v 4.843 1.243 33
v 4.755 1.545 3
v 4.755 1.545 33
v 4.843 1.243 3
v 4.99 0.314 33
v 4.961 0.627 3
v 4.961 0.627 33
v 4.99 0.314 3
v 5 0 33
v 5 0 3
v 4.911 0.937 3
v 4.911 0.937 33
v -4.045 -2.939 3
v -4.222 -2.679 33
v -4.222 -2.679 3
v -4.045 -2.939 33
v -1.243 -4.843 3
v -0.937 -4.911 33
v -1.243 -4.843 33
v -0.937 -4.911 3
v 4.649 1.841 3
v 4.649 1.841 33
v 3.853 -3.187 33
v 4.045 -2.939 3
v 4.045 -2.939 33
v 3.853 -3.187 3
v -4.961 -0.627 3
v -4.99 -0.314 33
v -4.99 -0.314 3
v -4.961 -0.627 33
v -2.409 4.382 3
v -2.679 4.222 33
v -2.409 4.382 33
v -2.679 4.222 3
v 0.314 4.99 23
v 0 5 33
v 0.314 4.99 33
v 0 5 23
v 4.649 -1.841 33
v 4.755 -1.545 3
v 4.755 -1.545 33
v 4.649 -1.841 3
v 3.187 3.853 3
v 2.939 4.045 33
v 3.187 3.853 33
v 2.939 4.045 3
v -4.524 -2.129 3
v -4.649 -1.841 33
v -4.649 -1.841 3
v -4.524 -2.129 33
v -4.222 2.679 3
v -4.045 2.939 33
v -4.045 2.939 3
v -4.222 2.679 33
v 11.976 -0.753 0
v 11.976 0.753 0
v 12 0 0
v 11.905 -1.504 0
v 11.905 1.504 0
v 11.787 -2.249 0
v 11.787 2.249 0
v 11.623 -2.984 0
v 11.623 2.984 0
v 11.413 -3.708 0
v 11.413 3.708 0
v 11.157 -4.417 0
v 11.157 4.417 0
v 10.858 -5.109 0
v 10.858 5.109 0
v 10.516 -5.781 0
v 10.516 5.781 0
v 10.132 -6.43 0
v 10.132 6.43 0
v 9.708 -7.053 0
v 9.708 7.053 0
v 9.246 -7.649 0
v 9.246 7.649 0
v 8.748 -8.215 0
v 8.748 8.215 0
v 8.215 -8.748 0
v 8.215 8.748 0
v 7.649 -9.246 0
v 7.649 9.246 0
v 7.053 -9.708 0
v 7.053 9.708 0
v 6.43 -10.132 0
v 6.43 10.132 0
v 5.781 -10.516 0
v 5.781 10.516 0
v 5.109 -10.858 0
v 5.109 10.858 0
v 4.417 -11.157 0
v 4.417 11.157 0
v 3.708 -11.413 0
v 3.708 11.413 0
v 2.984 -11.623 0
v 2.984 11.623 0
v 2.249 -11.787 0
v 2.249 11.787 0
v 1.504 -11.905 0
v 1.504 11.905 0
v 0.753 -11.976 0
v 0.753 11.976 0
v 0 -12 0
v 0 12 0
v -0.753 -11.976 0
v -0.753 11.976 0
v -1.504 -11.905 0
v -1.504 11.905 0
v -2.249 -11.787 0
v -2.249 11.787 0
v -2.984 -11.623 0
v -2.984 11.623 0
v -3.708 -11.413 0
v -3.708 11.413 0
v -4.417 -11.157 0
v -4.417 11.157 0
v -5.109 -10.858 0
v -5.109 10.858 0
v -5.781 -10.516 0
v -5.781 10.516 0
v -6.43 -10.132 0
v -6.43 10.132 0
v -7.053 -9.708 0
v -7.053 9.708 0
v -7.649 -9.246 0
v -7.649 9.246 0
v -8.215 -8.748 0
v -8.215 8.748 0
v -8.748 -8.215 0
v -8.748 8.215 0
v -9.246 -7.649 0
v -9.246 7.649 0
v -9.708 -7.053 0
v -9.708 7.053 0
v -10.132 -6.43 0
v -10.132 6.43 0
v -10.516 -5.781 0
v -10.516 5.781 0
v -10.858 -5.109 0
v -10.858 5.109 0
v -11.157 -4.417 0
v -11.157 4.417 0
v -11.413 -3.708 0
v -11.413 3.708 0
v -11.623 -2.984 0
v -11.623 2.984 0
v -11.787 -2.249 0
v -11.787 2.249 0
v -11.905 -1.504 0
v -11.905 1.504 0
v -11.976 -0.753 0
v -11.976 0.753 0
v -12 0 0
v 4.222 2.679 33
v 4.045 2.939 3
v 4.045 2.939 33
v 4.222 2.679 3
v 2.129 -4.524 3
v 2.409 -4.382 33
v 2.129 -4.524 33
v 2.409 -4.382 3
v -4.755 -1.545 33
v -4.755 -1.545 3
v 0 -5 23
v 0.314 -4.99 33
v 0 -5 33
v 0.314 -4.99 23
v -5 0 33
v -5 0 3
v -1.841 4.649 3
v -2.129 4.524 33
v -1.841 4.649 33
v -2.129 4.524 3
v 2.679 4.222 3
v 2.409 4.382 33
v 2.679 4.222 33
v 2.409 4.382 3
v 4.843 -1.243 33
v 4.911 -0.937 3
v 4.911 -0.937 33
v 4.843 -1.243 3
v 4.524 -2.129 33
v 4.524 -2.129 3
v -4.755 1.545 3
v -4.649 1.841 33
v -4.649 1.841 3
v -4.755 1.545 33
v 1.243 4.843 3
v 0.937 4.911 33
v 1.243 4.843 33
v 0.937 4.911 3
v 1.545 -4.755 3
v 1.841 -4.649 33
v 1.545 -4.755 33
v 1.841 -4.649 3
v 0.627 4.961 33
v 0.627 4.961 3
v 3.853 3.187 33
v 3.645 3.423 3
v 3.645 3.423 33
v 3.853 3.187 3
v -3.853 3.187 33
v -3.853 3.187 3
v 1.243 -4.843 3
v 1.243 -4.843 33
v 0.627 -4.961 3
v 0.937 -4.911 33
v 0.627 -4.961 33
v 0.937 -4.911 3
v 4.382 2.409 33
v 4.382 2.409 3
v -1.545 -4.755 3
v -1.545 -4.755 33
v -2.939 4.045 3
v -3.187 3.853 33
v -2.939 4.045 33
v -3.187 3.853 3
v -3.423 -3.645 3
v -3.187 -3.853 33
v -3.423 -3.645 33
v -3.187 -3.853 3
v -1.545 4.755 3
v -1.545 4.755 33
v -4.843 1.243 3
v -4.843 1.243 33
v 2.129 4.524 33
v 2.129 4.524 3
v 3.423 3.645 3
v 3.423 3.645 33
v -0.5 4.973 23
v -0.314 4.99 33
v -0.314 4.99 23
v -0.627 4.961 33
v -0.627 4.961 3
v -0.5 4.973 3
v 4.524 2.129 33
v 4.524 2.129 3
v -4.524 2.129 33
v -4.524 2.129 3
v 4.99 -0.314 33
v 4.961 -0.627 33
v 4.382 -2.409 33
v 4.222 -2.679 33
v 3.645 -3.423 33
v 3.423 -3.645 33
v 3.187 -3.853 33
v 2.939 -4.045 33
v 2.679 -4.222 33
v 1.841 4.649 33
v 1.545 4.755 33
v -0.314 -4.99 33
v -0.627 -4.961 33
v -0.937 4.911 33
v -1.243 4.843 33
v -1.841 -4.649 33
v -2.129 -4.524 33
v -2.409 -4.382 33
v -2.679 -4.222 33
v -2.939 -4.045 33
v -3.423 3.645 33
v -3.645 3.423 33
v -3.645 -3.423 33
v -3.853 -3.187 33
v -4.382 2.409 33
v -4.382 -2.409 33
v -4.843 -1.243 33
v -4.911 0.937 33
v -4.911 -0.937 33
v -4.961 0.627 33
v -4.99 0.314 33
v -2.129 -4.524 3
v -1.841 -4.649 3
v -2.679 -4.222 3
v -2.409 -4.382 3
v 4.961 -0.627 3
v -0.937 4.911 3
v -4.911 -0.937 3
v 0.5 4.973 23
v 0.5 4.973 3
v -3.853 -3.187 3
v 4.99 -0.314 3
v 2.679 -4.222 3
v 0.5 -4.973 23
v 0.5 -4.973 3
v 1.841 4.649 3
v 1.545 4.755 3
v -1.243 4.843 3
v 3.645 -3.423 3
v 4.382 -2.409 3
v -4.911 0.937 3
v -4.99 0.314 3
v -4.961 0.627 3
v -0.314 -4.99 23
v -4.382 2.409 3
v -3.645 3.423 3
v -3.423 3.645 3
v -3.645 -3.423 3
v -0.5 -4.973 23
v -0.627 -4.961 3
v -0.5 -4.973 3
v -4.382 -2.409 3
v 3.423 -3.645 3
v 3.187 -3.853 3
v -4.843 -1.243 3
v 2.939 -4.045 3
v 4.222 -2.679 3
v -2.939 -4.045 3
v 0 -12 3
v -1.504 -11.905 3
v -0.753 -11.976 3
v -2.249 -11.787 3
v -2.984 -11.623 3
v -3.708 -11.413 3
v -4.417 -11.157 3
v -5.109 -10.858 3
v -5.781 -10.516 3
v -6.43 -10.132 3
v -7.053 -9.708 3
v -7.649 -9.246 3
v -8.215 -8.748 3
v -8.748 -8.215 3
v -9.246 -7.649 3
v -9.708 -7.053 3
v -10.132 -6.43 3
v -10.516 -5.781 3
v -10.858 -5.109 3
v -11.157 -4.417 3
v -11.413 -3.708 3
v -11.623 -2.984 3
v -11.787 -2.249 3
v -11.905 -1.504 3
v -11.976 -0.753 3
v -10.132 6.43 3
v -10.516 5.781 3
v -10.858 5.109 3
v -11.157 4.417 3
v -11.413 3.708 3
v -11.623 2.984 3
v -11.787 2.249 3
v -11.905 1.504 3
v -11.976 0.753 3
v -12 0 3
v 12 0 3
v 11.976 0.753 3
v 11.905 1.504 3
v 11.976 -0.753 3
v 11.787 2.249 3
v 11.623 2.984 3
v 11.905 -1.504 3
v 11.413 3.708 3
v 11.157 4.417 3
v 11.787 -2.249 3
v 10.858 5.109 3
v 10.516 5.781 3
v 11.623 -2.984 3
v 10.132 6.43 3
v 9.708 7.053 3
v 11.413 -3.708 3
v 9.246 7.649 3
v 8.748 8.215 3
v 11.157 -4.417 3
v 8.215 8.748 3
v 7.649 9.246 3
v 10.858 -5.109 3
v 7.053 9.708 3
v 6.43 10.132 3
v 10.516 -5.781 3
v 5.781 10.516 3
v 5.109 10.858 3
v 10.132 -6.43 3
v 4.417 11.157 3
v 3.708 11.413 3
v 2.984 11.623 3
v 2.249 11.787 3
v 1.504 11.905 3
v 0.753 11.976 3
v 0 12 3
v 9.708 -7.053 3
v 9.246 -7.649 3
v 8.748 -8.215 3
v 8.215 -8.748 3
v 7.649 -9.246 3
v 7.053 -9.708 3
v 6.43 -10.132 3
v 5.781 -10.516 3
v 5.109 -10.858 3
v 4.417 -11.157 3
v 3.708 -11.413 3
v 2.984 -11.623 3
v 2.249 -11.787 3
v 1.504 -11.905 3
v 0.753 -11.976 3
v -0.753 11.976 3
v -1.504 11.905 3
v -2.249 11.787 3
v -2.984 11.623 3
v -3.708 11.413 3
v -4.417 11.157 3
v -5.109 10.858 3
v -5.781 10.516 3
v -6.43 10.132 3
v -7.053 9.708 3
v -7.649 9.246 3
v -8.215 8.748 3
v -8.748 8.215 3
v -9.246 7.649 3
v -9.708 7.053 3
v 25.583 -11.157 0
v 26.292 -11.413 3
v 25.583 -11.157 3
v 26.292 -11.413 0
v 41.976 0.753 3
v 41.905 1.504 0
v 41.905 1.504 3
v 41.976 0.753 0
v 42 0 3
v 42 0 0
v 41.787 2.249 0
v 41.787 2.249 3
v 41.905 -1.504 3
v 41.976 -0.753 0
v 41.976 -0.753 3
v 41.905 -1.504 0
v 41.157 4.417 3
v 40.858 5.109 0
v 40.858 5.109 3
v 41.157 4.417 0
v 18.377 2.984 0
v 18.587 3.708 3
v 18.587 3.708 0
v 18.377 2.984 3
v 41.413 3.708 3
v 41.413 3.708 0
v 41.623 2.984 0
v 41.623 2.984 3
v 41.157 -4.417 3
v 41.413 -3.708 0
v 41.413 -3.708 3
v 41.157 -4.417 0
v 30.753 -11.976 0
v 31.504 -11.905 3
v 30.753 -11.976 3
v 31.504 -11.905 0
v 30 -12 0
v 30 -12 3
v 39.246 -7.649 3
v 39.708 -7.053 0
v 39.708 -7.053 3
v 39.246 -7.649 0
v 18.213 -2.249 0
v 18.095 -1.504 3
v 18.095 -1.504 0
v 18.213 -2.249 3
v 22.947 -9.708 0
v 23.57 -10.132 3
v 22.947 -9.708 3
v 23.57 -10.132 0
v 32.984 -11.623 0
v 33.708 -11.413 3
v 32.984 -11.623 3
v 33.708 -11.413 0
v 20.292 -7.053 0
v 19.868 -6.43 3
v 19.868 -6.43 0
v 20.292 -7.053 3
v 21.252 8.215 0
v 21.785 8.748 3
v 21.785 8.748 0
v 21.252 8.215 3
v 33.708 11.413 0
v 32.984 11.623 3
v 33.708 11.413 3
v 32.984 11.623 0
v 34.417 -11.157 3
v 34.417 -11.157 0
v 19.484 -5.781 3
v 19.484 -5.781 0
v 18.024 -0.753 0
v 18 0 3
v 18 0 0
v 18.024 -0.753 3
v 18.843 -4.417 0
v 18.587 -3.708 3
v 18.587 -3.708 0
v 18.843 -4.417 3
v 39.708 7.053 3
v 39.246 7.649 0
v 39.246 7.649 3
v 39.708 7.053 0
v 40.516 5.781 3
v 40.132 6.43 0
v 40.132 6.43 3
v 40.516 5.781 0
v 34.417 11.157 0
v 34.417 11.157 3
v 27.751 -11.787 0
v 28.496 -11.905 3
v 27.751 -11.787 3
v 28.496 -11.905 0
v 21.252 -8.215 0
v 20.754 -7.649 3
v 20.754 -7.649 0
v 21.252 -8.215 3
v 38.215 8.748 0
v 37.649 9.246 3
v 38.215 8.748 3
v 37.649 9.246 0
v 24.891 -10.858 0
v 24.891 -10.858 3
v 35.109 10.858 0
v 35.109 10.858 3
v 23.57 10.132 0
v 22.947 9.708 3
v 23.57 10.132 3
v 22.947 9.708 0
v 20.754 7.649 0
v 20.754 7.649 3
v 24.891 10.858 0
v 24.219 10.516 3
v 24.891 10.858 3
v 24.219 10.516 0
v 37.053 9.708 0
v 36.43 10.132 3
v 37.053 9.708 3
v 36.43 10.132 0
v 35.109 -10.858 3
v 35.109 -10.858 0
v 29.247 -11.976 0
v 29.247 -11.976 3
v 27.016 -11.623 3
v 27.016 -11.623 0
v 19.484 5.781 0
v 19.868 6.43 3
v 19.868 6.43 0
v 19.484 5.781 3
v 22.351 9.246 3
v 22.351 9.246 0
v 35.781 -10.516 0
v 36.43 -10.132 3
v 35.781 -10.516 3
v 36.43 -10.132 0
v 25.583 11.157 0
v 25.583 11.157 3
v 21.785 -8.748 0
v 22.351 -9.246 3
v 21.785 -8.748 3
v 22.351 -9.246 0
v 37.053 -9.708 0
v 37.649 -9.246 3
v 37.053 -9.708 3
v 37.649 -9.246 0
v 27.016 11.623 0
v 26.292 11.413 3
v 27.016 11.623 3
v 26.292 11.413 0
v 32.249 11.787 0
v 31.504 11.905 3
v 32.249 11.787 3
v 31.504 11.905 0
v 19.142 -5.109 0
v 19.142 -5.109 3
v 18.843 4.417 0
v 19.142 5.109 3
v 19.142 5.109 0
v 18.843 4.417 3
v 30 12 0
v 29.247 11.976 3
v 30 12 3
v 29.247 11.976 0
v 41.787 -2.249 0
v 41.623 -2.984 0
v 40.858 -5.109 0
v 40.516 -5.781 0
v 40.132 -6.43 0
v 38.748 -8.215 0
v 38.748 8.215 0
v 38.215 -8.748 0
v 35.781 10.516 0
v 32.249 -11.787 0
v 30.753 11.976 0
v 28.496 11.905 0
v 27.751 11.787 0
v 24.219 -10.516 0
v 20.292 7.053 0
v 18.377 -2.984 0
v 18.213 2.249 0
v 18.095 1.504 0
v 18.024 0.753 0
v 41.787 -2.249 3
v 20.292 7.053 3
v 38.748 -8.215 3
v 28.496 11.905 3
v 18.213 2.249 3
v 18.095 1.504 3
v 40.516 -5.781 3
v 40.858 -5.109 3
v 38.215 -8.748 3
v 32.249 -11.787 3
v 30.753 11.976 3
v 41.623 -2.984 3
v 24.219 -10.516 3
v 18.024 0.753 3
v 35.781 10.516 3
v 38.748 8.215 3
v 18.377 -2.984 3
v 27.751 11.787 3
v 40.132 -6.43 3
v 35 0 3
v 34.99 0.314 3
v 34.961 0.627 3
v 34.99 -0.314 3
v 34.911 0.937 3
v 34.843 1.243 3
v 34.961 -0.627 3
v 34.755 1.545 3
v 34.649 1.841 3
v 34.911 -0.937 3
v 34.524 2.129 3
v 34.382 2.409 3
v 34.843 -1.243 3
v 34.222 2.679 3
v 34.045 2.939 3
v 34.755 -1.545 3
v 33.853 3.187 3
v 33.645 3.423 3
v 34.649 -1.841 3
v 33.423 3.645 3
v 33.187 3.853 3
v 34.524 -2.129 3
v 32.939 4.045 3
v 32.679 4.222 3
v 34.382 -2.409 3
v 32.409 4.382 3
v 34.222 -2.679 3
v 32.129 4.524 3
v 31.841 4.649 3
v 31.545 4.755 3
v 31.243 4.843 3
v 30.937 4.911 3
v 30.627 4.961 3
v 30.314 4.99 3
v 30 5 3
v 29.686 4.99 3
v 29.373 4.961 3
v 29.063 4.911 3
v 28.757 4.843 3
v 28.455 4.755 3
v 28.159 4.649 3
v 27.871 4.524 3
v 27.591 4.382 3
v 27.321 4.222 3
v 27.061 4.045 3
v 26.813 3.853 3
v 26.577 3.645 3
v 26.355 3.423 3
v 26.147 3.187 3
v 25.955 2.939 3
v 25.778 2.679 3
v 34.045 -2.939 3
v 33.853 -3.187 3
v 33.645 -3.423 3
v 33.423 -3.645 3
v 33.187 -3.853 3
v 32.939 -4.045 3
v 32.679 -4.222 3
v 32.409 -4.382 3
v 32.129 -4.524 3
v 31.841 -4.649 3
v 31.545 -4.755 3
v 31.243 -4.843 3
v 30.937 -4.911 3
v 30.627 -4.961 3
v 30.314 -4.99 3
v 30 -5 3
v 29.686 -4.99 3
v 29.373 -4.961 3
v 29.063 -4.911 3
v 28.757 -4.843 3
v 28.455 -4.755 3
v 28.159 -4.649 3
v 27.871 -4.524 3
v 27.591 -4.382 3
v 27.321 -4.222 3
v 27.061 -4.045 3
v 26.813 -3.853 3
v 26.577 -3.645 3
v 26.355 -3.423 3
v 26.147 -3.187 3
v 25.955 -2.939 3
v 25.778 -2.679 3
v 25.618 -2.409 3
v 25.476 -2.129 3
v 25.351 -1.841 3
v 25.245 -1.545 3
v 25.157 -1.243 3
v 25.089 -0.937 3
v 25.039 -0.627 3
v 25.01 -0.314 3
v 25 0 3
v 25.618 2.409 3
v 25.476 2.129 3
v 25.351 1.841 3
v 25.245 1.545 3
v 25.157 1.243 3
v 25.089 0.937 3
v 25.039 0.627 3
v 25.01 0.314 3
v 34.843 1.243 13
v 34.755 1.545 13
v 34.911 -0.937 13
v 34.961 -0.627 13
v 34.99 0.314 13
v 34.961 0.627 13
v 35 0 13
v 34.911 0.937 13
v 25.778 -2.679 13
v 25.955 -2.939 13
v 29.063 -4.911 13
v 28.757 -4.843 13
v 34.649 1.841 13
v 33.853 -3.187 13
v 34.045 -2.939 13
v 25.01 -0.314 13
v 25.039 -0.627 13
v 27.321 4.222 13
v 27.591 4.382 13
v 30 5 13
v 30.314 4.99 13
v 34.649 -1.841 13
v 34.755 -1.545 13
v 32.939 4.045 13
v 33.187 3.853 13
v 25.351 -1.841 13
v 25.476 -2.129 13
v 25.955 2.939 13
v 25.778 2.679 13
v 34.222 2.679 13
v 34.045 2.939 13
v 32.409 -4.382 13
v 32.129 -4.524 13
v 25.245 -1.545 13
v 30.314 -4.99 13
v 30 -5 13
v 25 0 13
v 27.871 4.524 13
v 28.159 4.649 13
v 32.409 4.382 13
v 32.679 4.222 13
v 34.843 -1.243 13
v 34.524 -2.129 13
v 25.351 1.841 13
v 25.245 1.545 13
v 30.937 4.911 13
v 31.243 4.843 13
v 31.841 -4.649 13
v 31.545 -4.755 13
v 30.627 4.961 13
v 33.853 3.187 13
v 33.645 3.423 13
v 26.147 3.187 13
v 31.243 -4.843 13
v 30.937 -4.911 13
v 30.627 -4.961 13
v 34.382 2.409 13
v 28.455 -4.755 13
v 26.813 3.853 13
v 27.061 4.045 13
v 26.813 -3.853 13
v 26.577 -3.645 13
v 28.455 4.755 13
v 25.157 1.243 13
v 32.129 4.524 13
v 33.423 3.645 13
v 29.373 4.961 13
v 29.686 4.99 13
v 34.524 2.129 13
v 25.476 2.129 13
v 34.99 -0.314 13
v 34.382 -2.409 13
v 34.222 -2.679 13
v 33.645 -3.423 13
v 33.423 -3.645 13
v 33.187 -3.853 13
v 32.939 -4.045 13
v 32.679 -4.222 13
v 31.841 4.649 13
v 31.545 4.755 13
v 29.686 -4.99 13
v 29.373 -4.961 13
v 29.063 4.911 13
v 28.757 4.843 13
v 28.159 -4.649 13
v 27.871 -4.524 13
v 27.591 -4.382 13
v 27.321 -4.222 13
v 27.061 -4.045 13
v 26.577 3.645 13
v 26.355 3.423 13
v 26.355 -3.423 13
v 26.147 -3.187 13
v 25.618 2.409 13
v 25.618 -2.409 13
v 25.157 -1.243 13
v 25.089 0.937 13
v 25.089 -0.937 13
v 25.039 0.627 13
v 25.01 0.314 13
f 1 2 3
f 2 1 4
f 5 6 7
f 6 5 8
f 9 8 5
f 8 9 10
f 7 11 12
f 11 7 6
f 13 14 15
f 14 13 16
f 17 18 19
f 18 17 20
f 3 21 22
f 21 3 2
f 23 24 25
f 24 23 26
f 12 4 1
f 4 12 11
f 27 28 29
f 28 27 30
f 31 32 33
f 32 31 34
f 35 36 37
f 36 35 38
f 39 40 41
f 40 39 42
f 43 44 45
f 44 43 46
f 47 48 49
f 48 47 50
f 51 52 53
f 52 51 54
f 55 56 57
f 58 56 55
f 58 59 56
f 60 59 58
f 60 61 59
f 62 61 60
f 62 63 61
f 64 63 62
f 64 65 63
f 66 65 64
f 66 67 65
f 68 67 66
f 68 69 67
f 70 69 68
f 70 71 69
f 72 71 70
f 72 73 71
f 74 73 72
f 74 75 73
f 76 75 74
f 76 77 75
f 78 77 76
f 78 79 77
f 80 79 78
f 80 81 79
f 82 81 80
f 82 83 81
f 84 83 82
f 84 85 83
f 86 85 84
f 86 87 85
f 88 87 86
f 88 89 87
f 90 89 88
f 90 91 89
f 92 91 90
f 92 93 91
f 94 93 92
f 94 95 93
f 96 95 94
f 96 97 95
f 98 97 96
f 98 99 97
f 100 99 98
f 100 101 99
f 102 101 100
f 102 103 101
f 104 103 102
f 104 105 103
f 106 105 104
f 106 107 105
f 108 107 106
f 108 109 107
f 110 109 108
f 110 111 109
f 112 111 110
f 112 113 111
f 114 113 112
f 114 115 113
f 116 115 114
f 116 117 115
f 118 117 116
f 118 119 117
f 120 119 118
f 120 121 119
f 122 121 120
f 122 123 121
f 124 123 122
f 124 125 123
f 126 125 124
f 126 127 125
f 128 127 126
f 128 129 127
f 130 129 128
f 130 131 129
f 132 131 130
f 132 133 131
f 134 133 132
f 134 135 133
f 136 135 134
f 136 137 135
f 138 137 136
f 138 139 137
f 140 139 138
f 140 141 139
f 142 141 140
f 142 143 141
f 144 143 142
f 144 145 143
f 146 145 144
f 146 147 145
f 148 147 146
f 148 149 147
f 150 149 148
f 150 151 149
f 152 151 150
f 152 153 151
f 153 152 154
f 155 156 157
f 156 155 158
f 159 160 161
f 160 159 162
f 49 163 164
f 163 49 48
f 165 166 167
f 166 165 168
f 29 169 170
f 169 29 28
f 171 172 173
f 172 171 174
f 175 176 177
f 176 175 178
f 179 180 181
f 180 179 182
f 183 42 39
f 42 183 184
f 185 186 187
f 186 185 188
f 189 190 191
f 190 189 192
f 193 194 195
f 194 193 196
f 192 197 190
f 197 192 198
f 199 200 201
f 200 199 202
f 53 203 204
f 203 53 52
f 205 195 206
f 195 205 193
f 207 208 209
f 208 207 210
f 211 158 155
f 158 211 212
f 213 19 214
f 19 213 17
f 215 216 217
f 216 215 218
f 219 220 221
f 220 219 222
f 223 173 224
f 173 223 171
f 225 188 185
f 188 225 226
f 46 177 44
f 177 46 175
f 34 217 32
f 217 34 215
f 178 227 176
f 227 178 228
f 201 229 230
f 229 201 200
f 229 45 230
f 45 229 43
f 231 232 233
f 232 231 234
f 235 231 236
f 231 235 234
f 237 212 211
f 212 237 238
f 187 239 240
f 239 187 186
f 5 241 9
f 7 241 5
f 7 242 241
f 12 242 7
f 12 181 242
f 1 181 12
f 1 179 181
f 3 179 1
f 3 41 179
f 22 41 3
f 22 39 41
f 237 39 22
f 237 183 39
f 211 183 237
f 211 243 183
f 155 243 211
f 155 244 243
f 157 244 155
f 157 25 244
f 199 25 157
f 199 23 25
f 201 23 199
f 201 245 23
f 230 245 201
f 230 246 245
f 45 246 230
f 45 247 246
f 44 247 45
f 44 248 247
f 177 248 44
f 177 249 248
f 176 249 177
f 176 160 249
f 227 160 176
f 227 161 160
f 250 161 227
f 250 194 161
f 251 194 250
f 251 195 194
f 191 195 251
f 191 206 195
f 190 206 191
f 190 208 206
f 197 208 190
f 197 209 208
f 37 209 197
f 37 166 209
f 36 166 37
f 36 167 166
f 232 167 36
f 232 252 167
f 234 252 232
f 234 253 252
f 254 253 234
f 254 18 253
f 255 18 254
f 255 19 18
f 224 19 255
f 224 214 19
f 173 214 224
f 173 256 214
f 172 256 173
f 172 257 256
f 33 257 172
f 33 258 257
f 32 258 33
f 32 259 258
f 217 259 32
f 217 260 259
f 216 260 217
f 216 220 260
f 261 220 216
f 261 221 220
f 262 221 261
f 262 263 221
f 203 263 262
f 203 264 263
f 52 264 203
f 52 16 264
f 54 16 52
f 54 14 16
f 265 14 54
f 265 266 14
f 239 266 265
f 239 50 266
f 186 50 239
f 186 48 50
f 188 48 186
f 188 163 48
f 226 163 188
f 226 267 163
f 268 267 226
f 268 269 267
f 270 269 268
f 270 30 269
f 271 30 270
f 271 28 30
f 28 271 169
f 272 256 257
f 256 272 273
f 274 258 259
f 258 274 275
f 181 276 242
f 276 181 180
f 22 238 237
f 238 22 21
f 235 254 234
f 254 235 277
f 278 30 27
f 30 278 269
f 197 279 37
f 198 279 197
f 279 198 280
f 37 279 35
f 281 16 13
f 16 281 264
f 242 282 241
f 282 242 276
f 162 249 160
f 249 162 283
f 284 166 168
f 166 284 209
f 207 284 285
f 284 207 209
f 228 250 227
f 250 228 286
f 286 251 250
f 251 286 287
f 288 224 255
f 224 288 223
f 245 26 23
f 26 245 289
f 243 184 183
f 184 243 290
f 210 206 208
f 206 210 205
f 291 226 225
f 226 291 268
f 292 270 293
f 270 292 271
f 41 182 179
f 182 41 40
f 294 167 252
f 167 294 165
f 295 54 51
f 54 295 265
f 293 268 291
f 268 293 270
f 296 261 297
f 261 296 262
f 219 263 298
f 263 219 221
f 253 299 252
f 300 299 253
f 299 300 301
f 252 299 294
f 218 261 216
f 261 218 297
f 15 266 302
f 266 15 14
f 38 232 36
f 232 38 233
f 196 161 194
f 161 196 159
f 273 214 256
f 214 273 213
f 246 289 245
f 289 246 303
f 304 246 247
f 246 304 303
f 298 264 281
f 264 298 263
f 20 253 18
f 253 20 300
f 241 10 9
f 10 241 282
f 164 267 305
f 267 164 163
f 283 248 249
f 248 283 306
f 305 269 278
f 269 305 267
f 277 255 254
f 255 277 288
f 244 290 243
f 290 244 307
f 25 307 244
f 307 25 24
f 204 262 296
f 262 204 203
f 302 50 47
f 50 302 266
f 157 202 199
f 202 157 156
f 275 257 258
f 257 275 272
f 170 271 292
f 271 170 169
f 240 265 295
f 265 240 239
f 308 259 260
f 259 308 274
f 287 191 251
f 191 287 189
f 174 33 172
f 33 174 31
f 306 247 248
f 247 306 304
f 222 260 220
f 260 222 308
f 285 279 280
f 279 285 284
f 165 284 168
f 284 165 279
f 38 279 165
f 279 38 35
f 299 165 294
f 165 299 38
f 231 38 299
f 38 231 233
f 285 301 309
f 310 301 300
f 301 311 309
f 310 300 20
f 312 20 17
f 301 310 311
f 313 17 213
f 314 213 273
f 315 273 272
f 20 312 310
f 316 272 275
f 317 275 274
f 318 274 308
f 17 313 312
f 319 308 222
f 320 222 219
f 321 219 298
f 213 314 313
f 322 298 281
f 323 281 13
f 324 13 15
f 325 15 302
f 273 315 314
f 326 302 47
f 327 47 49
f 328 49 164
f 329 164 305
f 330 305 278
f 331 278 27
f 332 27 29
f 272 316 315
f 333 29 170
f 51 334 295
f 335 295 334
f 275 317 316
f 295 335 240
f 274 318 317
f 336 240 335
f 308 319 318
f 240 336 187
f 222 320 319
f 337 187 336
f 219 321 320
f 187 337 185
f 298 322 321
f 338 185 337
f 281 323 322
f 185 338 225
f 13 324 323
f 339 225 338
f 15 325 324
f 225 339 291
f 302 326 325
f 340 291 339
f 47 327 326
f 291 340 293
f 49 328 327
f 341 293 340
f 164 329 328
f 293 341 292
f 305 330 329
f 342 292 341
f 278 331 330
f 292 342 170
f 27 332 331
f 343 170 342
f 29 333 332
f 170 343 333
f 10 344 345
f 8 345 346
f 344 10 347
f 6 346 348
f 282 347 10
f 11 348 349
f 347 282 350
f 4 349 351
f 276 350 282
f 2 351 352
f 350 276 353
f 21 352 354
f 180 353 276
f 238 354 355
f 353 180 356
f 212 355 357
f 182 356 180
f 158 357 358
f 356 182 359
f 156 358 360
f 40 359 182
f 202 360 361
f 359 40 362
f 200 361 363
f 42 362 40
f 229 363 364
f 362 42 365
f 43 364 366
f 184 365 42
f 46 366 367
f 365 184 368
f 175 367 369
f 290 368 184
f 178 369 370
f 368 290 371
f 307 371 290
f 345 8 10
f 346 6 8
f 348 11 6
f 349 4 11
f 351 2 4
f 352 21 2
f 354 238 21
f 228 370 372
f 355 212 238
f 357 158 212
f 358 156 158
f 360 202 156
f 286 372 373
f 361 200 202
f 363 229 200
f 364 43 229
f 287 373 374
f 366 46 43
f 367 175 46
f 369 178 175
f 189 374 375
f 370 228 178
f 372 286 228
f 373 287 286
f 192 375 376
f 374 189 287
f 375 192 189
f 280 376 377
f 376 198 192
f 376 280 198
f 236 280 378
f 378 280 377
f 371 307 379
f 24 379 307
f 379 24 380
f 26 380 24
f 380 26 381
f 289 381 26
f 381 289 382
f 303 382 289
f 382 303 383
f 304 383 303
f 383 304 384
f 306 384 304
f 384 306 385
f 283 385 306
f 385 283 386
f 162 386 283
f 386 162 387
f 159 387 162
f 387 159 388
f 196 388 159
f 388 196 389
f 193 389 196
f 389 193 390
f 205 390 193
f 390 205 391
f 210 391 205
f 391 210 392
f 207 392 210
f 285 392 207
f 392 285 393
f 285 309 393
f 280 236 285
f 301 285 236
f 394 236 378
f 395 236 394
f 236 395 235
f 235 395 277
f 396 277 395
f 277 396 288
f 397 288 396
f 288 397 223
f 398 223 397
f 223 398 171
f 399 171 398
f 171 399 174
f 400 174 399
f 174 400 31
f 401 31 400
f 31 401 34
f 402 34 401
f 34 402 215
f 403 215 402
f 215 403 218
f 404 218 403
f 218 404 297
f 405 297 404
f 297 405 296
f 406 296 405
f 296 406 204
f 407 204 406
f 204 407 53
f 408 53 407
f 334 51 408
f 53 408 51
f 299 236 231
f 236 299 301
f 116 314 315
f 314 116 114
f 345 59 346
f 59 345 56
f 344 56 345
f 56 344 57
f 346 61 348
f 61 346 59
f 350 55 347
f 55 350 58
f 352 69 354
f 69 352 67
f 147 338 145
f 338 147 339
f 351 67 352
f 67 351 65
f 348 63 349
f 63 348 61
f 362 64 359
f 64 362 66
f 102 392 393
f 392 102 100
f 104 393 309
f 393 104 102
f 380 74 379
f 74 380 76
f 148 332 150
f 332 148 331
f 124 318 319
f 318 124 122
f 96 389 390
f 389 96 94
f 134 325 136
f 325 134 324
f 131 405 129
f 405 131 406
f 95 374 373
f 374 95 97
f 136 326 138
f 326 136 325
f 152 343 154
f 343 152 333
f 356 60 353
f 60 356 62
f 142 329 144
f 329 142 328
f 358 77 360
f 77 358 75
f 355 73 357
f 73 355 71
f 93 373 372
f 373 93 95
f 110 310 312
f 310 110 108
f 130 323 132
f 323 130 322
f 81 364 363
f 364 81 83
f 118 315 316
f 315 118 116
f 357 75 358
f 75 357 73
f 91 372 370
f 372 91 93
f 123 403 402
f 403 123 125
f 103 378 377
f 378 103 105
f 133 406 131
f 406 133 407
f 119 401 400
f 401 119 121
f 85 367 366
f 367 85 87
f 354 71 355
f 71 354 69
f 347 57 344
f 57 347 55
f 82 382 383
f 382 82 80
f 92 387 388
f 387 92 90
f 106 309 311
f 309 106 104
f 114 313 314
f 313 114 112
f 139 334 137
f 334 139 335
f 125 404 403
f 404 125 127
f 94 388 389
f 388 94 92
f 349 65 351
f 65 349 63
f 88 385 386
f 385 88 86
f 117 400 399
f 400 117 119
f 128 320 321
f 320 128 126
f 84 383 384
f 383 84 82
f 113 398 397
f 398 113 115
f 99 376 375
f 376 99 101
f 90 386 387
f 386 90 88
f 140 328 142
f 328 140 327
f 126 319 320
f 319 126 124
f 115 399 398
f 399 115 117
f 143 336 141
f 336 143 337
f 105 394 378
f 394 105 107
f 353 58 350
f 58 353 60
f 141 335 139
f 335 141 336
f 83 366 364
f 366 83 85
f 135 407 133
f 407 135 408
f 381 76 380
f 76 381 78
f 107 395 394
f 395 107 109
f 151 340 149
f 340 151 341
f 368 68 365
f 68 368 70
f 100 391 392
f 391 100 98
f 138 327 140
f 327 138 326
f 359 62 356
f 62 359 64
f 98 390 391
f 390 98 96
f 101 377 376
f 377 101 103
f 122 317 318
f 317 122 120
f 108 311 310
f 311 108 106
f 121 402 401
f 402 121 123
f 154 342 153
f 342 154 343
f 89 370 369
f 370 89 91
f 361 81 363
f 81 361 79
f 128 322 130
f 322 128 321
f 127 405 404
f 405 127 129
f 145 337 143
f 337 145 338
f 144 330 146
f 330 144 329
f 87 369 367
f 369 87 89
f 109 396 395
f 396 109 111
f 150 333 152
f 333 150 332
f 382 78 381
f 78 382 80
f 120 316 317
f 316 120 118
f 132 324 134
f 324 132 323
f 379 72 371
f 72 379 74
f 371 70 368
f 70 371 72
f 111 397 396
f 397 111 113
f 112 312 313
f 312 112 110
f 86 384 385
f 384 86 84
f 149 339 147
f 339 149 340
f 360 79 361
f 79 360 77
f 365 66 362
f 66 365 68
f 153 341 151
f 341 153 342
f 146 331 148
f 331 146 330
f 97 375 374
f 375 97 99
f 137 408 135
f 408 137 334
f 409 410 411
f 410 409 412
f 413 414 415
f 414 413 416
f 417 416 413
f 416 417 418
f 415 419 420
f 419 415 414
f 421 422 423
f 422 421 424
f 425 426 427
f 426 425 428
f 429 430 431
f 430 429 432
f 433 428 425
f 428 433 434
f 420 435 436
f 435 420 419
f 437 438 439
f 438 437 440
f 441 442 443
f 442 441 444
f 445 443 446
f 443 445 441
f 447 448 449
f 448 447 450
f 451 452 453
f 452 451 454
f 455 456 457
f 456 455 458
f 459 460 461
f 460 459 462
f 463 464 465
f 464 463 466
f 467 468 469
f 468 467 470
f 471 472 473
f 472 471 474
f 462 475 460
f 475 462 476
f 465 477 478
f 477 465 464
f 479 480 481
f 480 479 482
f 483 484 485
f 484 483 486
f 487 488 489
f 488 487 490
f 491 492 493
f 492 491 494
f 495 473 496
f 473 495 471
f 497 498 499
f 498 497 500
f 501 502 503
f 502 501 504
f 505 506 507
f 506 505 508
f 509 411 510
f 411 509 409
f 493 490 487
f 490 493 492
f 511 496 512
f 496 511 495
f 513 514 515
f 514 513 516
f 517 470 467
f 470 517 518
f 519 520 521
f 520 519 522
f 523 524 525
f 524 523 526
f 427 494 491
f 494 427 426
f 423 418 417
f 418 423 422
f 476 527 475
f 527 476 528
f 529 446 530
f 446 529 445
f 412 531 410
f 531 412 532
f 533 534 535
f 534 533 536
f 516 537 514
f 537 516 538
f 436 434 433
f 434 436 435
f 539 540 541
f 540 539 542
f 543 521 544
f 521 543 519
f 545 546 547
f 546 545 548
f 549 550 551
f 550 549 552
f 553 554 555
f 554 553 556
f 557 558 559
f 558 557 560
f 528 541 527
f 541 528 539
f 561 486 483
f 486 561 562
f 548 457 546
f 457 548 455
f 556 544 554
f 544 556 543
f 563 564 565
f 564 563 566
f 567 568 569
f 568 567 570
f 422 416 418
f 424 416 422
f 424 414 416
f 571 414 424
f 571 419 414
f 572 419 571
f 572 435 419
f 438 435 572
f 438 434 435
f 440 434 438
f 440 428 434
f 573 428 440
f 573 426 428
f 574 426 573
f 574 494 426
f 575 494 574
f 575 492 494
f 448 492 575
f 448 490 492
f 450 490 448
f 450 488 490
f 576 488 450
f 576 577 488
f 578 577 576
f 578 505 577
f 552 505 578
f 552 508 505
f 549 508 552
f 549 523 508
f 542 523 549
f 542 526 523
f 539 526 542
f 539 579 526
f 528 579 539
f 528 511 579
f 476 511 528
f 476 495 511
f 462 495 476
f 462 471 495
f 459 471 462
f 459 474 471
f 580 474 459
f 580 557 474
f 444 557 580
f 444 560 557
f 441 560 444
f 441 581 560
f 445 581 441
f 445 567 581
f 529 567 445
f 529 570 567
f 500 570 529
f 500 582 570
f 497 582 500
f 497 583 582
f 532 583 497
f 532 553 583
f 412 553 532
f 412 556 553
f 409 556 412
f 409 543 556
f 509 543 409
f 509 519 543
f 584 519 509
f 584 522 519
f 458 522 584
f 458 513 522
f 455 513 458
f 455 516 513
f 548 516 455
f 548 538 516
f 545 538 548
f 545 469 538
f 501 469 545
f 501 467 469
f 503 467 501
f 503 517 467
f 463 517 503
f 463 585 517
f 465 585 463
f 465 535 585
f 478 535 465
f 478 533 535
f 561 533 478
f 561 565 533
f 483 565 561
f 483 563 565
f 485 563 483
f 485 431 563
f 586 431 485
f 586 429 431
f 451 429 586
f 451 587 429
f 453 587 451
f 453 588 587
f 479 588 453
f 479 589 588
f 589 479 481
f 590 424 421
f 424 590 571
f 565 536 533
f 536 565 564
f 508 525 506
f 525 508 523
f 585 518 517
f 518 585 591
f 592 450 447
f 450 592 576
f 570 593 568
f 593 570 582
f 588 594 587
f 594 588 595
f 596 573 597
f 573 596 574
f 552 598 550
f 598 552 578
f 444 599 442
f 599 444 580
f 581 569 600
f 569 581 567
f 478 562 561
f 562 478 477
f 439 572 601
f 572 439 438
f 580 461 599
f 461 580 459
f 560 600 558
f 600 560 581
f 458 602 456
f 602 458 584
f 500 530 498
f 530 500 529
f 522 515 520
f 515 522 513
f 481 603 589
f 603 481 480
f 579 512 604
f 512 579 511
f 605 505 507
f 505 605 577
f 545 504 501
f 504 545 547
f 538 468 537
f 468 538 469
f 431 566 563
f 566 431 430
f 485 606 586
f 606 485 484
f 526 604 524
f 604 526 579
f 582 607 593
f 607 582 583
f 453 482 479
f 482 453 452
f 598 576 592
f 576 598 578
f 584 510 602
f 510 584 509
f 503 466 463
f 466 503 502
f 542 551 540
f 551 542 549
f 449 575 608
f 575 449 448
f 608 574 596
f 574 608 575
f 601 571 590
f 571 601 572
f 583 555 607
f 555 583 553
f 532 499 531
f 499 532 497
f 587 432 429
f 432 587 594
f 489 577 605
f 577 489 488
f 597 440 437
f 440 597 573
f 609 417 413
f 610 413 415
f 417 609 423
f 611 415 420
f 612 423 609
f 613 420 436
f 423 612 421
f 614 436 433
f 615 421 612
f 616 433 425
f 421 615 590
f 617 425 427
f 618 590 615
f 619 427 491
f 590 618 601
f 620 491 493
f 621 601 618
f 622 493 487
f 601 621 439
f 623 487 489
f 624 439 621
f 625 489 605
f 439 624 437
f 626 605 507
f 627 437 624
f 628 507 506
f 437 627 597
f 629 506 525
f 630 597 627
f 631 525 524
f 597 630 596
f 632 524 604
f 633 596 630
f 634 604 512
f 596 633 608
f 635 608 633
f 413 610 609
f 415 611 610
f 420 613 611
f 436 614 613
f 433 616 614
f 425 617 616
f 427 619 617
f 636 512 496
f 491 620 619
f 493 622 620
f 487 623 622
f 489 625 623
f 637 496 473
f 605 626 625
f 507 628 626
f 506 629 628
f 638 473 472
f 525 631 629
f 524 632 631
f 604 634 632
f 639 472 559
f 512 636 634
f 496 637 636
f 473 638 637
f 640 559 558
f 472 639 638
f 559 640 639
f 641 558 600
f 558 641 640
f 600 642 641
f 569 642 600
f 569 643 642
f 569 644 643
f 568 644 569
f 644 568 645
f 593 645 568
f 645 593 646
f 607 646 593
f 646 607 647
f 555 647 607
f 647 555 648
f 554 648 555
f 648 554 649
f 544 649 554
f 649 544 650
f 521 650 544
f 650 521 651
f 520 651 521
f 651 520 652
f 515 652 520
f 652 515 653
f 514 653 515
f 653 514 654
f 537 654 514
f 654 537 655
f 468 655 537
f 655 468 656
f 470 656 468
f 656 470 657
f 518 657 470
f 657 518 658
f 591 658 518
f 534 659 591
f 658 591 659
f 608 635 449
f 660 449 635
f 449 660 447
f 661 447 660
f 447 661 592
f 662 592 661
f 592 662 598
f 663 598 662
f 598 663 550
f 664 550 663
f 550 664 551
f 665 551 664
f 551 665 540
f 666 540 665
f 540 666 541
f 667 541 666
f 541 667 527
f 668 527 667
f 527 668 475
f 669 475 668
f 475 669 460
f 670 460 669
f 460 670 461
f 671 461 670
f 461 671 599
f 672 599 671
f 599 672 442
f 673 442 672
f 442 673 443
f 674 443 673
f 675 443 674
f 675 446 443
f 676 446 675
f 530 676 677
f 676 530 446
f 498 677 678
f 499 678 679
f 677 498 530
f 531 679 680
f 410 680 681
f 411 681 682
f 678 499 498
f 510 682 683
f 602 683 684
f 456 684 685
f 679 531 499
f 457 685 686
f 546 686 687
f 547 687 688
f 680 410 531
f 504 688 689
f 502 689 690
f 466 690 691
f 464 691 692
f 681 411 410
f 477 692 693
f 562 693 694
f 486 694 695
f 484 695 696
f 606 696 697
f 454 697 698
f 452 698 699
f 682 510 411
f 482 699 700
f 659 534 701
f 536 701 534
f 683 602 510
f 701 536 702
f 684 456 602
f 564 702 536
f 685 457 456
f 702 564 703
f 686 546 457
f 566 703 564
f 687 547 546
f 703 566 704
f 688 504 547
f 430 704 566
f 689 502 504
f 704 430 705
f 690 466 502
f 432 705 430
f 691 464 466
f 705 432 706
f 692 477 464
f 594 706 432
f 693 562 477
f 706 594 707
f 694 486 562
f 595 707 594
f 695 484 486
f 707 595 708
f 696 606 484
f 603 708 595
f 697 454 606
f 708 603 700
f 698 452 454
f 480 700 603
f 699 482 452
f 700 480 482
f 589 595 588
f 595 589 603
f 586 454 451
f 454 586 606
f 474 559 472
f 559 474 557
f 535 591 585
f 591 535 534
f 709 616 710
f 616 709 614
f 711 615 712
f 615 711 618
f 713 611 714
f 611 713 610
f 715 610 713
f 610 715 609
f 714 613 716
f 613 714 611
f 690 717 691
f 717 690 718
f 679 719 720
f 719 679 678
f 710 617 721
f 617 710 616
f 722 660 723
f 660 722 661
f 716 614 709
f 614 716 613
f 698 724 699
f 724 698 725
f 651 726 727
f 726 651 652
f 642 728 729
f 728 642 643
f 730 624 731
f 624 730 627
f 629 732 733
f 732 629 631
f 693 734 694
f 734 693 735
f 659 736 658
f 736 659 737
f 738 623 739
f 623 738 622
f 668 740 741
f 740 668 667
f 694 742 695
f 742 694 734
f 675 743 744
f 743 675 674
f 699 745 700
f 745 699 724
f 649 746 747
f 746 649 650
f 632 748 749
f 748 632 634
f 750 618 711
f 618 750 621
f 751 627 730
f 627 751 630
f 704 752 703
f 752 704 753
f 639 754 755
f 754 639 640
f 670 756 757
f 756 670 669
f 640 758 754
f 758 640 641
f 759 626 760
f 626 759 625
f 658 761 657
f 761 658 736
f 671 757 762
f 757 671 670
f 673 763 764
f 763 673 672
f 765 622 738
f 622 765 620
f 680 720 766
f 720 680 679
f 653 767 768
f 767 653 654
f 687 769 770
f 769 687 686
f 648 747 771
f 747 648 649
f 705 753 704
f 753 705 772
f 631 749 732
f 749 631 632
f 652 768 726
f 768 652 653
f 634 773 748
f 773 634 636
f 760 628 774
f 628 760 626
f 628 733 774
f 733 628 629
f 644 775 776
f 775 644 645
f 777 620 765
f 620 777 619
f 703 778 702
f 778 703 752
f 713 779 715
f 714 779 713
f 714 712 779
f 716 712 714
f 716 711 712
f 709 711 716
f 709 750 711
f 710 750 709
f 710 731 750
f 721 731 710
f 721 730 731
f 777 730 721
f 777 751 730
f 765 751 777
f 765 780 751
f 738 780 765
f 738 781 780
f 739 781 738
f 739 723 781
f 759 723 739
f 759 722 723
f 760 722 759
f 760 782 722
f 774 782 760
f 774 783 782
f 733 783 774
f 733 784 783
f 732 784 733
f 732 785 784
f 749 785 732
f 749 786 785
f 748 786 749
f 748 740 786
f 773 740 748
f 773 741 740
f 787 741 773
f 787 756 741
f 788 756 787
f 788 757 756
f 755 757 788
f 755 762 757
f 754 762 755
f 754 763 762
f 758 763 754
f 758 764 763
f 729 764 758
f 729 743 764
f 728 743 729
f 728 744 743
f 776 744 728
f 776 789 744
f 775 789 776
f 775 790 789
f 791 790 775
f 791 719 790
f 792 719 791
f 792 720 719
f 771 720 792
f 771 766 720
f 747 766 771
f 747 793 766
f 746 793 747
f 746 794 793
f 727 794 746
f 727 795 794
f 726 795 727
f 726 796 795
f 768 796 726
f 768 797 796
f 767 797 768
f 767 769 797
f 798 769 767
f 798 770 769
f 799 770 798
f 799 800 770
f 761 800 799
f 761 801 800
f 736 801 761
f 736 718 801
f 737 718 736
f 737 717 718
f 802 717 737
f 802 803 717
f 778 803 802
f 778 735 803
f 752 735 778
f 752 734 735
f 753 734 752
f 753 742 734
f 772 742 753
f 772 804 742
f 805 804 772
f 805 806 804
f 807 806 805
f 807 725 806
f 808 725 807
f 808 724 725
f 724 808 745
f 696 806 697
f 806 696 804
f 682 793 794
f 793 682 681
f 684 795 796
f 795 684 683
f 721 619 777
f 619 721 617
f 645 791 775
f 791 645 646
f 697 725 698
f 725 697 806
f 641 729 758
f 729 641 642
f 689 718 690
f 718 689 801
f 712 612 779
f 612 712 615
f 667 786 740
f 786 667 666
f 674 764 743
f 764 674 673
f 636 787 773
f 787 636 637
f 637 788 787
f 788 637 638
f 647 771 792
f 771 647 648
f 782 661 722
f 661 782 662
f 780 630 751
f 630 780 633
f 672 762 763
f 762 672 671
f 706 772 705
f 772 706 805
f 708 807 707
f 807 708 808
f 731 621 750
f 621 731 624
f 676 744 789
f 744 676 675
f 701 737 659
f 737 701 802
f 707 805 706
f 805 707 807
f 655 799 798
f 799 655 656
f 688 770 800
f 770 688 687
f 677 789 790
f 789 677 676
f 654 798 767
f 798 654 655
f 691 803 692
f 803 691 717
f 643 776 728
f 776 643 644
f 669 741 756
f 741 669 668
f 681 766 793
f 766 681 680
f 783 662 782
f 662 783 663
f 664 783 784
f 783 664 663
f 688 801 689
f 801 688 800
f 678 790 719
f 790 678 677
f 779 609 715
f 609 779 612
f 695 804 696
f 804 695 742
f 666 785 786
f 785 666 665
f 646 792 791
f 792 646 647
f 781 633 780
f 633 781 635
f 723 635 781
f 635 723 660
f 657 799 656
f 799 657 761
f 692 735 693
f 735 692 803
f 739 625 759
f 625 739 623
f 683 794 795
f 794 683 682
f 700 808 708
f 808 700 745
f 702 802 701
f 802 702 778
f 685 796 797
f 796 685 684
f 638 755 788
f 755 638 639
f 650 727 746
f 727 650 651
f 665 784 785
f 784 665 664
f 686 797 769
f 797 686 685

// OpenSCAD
$fn=100;





module film_takeup_spool_bottom(wheel_height, wheel_radius, height, core_radius, film_slit_width, film_slit_height) {

    cylinder(h=wheel_height, r=wheel_radius);

    difference() {
        cylinder(h=height, r=core_radius);

        translate([-film_slit_width/2, -core_radius, 3])
        cube([film_slit_width, core_radius*2, film_slit_height]);

        //translate([0,0,height-(wheel_height*4)])
        //cylinder(r=core_radius/2, h=wheel_height*4);
    }
}

module film_takeup_spool_top(wheel_height, wheel_radius, height, core_radius, film_slit_width, film_slit_height) {

    cylinder(h=wheel_height, r=wheel_radius);
    cylinder(h=height, r=core_radius);
}



CORE_RADIUS = 5;
WHEEL_HEIGHT = 3;
WHEEL_RADIUS = 12;

film_takeup_spool_bottom(
    height=33,
    core_radius=CORE_RADIUS,
    film_slit_width=1,
    film_slit_height=20,
    wheel_height=WHEEL_HEIGHT,
    wheel_radius=WHEEL_RADIUS
);


translate([30,0,0])
film_takeup_spool_top(
    height=13,
    core_radius=CORE_RADIUS,
    film_slit_width=1,
    film_slit_height=20,
    wheel_height=WHEEL_HEIGHT,
    wheel_radius=WHEEL_RADIUS
);
